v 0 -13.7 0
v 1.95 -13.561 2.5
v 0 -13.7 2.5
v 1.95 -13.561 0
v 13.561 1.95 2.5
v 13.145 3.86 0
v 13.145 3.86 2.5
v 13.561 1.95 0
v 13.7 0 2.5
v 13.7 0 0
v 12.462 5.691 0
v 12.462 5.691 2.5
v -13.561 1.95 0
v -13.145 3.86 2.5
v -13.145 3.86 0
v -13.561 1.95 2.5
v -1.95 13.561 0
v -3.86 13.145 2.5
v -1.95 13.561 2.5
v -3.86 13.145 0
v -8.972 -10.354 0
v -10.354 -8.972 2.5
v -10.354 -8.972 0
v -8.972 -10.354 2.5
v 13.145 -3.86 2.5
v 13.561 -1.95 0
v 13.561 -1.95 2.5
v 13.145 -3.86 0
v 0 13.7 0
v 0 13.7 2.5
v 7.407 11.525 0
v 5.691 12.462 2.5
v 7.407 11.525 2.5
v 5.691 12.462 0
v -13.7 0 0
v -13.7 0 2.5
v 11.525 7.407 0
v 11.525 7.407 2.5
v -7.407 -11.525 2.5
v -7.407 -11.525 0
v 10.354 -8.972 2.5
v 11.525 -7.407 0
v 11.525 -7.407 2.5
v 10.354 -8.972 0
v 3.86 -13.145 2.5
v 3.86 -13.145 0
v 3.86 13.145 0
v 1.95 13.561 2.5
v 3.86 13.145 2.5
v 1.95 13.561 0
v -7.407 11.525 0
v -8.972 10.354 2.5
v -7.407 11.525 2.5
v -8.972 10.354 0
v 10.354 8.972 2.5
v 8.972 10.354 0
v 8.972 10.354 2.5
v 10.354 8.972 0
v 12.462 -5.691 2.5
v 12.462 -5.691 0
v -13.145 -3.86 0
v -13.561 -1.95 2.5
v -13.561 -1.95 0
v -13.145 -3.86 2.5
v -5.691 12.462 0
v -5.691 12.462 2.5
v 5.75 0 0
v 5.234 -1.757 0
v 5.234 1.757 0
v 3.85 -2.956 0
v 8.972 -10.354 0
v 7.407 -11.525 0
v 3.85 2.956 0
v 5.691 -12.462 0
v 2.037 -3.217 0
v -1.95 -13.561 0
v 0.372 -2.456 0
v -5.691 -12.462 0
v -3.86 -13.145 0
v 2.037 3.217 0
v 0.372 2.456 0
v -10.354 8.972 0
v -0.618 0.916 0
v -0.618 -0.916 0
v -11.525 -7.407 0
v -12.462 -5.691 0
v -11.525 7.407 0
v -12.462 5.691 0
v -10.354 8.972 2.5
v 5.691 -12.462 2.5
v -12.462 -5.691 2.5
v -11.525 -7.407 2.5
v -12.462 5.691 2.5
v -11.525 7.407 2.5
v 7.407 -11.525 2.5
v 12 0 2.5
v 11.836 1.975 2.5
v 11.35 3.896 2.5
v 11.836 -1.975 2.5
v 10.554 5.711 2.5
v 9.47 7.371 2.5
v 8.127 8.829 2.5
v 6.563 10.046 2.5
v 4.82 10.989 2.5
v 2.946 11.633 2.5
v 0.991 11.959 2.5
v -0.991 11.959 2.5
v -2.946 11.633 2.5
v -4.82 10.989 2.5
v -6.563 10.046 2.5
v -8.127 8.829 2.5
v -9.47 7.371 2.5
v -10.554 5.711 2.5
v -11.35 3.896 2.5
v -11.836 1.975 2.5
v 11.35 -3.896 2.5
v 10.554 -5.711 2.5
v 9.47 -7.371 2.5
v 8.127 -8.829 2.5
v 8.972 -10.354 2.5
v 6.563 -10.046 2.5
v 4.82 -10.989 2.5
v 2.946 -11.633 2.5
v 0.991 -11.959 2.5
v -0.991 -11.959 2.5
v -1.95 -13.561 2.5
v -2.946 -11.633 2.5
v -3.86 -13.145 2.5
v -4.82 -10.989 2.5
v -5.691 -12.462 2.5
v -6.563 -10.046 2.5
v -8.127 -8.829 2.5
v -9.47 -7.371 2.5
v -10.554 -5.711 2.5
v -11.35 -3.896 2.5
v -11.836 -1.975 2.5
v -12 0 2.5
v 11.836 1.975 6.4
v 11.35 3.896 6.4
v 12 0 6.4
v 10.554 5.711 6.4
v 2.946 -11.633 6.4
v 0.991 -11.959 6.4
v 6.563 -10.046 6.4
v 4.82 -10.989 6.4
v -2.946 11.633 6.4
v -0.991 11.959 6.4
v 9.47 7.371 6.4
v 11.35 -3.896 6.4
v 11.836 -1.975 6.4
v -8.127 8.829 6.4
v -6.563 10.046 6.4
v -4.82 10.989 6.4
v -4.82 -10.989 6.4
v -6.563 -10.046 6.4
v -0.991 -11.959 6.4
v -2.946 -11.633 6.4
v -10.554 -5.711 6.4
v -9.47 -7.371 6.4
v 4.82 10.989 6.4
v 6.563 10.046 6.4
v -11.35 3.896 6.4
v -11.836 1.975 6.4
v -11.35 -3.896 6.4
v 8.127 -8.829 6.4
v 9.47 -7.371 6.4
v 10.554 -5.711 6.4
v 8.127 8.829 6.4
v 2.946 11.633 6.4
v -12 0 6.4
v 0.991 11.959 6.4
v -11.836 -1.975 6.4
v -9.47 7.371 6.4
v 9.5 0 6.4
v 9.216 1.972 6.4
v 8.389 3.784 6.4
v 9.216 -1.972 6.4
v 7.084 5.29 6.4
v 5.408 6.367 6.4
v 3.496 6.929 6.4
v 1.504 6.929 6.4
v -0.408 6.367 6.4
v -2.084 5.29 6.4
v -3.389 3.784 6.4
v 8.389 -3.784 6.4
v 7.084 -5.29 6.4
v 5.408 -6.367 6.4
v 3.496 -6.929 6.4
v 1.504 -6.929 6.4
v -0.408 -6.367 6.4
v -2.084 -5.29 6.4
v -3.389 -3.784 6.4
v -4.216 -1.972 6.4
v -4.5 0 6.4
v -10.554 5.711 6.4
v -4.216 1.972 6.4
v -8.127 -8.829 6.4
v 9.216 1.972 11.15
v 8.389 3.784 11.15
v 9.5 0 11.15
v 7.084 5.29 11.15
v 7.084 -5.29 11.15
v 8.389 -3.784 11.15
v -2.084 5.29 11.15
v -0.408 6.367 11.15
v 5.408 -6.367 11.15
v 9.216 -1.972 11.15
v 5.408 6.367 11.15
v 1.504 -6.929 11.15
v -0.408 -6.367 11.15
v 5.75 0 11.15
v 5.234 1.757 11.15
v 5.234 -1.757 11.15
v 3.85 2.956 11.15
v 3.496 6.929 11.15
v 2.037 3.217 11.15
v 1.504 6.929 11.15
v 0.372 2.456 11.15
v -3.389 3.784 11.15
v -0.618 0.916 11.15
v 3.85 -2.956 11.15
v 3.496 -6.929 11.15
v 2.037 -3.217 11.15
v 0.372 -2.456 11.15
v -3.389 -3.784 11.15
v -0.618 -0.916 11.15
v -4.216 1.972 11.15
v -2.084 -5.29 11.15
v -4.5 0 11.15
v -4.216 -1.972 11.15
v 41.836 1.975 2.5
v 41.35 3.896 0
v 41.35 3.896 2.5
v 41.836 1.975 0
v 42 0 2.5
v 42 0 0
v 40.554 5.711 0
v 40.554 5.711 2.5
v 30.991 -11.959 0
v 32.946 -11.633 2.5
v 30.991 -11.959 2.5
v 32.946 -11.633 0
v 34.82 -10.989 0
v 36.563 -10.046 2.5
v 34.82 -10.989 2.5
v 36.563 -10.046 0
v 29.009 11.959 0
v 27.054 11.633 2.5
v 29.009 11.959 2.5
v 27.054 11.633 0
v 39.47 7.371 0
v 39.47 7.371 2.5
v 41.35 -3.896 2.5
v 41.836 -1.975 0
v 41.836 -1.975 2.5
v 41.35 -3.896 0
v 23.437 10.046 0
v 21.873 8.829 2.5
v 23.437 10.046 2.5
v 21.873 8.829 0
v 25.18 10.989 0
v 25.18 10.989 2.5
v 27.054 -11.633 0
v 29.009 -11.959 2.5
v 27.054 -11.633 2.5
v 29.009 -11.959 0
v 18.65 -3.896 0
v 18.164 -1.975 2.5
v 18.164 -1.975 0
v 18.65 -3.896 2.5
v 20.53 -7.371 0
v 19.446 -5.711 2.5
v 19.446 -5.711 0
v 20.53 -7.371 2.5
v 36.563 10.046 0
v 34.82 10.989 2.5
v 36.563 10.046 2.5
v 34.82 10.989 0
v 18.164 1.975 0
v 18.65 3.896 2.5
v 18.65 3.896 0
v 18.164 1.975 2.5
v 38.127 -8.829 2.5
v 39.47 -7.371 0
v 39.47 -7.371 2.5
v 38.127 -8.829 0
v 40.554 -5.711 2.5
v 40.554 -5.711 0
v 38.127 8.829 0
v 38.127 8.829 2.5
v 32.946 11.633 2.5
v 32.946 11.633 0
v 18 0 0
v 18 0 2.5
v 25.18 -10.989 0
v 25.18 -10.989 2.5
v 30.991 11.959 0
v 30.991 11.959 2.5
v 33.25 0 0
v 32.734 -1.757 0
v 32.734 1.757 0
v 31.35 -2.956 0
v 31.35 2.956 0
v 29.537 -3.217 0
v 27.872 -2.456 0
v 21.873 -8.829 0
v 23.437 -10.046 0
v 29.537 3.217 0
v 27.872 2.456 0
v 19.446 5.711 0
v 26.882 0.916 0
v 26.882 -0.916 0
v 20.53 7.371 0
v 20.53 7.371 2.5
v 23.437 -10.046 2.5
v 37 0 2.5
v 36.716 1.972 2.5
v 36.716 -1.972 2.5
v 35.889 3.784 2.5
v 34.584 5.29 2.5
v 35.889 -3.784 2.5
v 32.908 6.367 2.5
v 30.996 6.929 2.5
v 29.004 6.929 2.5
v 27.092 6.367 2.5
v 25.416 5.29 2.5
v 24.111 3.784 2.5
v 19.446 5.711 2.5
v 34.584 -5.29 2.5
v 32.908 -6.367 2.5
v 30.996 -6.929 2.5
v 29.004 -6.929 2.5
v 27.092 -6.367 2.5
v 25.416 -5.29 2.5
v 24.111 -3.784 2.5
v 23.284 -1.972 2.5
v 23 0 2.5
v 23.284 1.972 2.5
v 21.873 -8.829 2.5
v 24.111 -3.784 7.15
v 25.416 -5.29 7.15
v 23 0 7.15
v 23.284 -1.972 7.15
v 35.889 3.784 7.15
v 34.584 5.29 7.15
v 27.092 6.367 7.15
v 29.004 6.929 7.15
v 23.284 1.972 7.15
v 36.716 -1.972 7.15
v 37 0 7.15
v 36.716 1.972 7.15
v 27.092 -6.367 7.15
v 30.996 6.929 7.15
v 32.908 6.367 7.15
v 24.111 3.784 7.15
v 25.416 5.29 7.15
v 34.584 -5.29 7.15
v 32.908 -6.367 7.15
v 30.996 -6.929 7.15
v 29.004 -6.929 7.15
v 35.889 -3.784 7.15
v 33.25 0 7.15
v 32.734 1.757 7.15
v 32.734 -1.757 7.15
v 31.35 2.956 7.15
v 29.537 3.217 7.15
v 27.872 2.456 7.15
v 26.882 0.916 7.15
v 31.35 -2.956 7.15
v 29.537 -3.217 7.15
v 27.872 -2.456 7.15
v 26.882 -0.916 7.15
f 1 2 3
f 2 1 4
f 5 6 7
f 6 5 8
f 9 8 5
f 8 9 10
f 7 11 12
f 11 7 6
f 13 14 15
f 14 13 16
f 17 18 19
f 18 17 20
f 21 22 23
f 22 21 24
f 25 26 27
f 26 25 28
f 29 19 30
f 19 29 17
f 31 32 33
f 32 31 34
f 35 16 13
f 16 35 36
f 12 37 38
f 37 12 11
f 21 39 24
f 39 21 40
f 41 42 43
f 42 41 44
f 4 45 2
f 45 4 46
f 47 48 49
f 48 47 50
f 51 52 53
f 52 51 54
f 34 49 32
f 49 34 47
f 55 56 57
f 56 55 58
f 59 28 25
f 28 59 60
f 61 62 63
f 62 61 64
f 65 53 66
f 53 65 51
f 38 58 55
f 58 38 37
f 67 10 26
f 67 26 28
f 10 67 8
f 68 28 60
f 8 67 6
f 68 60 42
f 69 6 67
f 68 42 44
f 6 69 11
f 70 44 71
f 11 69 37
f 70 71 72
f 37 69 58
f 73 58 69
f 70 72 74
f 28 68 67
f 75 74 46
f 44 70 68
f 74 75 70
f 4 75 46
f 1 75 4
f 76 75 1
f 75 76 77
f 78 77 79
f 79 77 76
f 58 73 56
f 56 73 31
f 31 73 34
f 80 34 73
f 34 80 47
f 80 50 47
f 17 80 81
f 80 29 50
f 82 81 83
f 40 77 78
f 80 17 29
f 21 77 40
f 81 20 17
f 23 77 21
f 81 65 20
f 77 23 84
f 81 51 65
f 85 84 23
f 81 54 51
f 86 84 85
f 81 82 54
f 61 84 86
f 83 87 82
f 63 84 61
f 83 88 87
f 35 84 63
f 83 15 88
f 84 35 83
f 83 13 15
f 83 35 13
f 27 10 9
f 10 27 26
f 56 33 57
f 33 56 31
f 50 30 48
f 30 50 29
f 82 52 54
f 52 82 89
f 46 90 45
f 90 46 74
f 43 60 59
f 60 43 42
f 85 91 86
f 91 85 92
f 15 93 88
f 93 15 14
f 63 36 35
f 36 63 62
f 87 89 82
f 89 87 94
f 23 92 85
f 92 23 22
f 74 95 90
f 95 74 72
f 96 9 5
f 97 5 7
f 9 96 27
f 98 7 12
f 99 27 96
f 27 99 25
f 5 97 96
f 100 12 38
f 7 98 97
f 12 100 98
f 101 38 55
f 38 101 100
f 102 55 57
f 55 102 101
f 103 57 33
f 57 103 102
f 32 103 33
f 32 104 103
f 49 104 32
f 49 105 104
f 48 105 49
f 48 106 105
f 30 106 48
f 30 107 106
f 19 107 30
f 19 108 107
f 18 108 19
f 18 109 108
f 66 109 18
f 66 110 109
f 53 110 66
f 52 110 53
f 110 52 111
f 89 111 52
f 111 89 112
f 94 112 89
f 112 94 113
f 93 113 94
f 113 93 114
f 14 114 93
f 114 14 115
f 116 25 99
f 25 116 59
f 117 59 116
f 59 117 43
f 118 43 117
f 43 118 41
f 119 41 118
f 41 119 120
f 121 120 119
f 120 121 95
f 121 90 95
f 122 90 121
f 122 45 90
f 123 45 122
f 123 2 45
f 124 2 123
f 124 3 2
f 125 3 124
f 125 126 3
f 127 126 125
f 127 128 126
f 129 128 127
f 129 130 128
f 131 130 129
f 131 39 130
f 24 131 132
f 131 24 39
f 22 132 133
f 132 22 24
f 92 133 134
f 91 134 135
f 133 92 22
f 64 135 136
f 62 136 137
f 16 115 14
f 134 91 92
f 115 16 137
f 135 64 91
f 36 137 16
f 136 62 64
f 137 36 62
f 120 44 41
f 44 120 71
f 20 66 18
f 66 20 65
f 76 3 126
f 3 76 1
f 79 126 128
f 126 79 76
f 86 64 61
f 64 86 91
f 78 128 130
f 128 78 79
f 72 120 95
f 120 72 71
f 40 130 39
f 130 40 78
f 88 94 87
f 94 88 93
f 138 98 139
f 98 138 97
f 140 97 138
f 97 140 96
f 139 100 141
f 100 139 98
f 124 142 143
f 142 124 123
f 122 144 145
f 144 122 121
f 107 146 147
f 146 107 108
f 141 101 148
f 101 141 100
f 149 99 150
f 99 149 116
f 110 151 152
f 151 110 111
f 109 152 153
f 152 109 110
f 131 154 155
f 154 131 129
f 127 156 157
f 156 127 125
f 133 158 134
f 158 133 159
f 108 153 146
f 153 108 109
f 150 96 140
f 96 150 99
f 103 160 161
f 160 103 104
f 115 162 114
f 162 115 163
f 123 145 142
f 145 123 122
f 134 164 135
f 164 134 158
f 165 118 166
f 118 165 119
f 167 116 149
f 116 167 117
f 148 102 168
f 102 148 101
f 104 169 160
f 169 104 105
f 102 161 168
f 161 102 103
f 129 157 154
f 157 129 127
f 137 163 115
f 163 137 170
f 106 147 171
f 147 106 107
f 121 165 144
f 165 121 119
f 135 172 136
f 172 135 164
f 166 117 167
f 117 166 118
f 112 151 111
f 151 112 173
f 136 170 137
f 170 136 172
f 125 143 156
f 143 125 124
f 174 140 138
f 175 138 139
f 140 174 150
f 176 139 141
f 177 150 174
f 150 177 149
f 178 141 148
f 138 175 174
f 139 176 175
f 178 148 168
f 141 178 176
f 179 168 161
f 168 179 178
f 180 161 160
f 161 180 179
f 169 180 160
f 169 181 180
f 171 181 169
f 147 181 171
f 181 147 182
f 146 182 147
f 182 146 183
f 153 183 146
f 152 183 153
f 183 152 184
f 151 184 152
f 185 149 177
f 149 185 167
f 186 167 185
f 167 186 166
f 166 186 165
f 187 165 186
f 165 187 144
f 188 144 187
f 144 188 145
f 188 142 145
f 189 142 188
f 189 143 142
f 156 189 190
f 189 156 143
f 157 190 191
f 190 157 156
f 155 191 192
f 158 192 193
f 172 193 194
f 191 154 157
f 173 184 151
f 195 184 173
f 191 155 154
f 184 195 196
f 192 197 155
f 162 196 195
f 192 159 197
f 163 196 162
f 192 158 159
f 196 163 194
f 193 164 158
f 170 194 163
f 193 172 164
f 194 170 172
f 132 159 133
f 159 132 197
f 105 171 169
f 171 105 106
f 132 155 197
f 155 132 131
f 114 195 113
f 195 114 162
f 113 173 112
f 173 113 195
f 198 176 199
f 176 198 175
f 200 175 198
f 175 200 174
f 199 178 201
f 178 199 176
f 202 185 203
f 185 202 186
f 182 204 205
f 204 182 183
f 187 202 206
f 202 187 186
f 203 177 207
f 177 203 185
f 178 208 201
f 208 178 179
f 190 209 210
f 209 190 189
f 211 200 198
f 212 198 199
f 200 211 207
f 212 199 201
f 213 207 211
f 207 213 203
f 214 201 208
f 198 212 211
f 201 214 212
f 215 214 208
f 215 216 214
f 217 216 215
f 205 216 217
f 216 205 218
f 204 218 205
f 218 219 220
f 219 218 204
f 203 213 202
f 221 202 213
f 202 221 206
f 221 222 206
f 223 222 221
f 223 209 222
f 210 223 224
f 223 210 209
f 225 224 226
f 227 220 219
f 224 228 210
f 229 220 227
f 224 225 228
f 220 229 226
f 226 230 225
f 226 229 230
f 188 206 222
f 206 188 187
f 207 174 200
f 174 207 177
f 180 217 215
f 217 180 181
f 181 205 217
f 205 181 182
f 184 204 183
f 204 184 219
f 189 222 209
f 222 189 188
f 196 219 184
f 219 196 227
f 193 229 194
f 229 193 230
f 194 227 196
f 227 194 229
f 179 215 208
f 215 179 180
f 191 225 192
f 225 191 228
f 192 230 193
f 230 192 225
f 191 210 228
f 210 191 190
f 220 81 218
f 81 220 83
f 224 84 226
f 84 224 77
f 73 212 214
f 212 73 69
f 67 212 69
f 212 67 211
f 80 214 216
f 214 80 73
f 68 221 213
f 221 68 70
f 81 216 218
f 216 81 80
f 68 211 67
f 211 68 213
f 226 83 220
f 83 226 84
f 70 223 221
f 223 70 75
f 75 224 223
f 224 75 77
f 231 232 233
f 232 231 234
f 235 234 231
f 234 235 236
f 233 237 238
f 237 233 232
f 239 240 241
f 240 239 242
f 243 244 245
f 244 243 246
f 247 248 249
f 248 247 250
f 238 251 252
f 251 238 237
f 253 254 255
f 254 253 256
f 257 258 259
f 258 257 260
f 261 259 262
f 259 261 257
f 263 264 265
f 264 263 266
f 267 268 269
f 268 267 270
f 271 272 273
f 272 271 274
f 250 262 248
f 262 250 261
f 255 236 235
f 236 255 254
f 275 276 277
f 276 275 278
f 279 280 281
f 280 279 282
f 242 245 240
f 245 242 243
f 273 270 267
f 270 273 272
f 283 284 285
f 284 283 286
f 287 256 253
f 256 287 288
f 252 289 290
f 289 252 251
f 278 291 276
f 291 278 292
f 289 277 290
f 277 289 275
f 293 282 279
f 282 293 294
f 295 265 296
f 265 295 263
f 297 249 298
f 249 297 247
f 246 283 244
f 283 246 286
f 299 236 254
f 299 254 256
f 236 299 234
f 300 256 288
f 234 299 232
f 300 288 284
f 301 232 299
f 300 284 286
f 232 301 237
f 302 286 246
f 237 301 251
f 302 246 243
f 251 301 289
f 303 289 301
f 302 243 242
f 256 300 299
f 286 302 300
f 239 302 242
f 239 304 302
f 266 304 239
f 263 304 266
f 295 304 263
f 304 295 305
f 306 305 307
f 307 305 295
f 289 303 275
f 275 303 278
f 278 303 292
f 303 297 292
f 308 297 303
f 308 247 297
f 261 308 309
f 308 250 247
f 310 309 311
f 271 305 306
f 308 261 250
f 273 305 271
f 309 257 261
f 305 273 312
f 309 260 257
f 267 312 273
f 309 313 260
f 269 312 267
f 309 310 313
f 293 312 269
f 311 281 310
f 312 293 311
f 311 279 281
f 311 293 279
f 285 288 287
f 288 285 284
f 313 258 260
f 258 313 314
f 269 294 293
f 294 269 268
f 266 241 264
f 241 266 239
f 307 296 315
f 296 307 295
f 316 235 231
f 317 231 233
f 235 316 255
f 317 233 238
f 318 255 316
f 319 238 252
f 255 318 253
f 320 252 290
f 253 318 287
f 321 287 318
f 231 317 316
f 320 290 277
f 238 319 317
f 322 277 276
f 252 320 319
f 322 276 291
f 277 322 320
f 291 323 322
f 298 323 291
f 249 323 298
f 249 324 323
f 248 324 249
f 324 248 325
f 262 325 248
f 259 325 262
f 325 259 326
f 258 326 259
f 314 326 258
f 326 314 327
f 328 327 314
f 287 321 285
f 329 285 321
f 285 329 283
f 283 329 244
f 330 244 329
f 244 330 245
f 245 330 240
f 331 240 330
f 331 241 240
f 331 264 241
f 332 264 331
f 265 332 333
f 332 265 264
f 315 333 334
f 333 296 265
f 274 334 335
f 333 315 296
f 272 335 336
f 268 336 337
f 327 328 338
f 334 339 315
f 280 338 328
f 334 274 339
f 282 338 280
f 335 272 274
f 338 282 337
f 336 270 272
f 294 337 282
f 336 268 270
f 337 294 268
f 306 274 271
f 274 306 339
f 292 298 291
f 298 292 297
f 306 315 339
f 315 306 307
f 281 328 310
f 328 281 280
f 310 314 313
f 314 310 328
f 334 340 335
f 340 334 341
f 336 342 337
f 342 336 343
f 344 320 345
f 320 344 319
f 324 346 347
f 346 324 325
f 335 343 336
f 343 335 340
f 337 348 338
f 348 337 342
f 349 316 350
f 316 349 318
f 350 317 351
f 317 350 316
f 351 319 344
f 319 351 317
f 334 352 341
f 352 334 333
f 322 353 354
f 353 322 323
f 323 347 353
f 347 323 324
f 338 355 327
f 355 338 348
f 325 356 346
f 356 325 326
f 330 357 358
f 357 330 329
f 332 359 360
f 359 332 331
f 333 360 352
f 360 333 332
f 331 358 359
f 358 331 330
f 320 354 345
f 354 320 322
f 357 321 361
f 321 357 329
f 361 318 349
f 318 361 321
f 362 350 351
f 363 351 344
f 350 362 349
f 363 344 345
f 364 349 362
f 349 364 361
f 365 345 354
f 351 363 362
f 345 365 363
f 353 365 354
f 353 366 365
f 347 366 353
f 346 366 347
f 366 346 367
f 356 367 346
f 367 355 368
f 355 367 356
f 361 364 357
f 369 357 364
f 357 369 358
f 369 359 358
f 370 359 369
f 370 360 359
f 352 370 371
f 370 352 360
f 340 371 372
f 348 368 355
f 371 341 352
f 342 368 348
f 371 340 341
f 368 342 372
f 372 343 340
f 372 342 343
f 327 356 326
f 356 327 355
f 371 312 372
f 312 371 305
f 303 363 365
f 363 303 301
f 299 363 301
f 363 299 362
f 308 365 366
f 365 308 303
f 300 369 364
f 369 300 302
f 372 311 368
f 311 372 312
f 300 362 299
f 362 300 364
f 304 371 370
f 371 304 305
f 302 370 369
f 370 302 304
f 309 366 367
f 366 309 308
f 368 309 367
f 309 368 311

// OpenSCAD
$fa = 5;

holeDiameter = 14;
holeDepth = 9.5;
boltDiameter = 6.5;
bolTHeadDiameter = 11.5;
lowerFlangeDiameter = 24;
lowerFlangeThickness = 2.5;
topmostFlangeDiameter = 27.4;
topmostFlangeThickness = 2.5;
topInnerFlangeDiameter = 24;
topInnerFlangeThickness = 3.9;
upperBoltOffset = (145 - 140)/2;

module lowerFlange() {
    // Working from center to get them all concentric
    // but then each needs to get moved up to compensate for
    // z direction centering.
    difference() {
        union() {
            translate([0,0,lowerFlangeThickness/2])
                cylinder(h = lowerFlangeThickness,
                    d = lowerFlangeDiameter, center = true);
            translate([0,0,lowerFlangeThickness+holeDepth/4-0.1])
                cylinder(h = holeDepth/2, 
                    d = holeDiameter, center = true);
        }
        translate([0, 0, (lowerFlangeThickness + holeDepth/2)/2])
            cylinder(h = lowerFlangeThickness + holeDepth/2 + 0.1,
                d = boltDiameter, center = true);
    }
}

module upperFlange() {
    // Building it upside down
    difference() {
        union() {
            translate([0,0,topmostFlangeThickness/2])
                cylinder(h = topmostFlangeThickness,
                    d = topmostFlangeDiameter, center = true);
            translate([0,0,topmostFlangeThickness+topInnerFlangeThickness/2])
                cylinder(h = topInnerFlangeThickness,
                    d = topInnerFlangeDiameter, center = true);
            translate([upperBoltOffset,0,
                topmostFlangeThickness+topInnerFlangeThickness+
                holeDepth/4])
                cylinder(h = holeDepth/2,
                    d = holeDiameter, center = true);
        }
        translate([upperBoltOffset, 0, 
            (topmostFlangeThickness+topInnerFlangeThickness+
                holeDepth/2)/2])
            cylinder(h = topmostFlangeThickness+topInnerFlangeThickness+
                holeDepth/2 + 0.1,
                d = boltDiameter, center = true);
    }
}

upperFlange();

translate([30, 0, 0])
    lowerFlange();
